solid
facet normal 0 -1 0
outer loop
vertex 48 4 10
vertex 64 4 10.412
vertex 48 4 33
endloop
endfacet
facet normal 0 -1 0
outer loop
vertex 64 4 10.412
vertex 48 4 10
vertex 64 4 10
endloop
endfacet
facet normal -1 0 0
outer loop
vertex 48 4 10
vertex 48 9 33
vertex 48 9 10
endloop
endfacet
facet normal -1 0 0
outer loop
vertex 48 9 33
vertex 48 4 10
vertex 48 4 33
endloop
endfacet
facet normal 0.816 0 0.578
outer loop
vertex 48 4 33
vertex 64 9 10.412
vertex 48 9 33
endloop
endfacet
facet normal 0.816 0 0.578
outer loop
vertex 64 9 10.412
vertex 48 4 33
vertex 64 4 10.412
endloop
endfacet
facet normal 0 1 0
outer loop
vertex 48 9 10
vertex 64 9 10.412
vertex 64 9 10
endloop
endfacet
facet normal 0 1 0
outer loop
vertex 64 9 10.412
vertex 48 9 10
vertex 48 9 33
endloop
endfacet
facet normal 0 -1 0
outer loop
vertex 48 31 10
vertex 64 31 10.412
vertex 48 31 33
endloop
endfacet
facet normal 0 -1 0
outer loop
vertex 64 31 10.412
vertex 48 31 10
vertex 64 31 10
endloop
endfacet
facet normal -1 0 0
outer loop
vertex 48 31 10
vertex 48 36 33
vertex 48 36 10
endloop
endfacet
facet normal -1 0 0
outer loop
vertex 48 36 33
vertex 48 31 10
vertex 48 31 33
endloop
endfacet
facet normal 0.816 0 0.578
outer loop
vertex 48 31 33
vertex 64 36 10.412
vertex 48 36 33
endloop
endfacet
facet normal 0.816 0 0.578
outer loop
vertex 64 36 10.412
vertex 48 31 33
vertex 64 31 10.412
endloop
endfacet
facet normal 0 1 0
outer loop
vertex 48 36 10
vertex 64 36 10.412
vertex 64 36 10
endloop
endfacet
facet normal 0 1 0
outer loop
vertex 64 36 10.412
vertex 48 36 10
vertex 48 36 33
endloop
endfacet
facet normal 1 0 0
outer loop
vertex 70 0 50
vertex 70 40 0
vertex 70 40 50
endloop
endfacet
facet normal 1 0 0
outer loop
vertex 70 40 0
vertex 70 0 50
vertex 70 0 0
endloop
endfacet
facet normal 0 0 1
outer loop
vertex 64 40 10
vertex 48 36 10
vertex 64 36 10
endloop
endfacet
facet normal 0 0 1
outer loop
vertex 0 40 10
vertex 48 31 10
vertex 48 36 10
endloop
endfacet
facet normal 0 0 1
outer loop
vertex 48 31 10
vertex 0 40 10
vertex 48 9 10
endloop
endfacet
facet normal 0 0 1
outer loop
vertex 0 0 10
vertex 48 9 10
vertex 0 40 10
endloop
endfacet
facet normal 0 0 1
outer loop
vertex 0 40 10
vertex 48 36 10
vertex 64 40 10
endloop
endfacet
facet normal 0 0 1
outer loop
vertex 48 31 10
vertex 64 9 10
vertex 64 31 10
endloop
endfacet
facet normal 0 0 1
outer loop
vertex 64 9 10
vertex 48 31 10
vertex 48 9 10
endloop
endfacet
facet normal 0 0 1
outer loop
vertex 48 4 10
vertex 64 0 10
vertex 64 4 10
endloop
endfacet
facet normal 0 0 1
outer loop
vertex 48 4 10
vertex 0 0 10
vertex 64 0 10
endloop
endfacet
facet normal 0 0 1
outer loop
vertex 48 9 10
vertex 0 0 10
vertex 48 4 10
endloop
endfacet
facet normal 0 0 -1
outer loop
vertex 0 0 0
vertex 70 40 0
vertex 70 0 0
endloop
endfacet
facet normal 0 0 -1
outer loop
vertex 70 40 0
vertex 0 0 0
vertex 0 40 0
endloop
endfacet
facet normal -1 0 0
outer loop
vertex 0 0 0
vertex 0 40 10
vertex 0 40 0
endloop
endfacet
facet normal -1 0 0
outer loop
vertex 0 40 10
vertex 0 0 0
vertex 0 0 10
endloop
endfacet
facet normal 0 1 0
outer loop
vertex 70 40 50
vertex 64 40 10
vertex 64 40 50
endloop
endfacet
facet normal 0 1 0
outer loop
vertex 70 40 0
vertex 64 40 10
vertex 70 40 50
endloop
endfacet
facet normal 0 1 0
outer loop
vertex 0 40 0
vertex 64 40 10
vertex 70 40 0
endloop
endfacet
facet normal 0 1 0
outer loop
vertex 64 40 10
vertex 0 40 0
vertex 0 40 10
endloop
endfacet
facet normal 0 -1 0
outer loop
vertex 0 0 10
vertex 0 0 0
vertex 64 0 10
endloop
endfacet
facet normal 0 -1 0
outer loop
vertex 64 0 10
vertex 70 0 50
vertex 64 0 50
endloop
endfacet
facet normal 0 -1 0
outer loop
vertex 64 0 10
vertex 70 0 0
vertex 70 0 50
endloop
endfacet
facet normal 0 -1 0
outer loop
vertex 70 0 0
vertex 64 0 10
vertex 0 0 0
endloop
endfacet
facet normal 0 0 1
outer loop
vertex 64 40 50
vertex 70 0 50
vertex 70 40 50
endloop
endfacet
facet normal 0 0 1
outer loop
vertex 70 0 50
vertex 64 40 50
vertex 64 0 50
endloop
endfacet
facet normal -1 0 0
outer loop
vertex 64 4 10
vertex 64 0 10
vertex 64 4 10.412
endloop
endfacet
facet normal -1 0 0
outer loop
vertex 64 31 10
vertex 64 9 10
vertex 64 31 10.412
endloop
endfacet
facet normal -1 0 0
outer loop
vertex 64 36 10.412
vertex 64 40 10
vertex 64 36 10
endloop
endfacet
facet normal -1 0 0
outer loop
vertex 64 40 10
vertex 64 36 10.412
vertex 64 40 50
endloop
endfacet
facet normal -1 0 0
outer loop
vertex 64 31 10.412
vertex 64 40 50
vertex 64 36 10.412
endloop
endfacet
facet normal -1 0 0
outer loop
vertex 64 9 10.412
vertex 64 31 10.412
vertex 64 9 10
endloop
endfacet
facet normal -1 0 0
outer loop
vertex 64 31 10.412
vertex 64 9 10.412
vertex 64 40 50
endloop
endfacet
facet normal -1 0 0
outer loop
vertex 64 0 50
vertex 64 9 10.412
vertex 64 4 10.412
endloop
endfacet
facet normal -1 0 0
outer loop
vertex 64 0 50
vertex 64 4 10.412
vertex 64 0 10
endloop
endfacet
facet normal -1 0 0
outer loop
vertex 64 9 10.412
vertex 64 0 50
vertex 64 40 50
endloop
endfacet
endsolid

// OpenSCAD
$fn = 32;

// ----------------------------------------------------------------------
// Rib bracket: 2-gusset L bracket
// ----------------------------------------------------------------------

// --- parameters (mm) ---
base_l = 70;              // foot length, X
base_w = 40;              // foot width, Y
base_t = 10;              // foot thickness
plate_t = 6;              // upright plate thickness
plate_h = 50;             // overall height
gus_l = 16;               // gusset leg along the foot
gus_h = 24;               // gusset height
gus_t = 5;                // gusset thickness
gus_edge = 4;             // gusset margin from the foot edge
n_gus = 2;                // gusset count

gus_pitch = (base_w - 2 * gus_edge - gus_t) / (n_gus - 1);  // gusset pitch

union() {
  cube([base_l, base_w, base_t]);
  translate([base_l - plate_t, 0, base_t - 1])
    cube([plate_t, base_w, plate_h - base_t + 1]);
  for (i = [0 : n_gus - 1])
    translate([base_l - plate_t - gus_l, gus_edge + i * gus_pitch, base_t - 1])
      rotate([-90, 0, 0])
        linear_extrude(height = gus_t)
          polygon(points = [[0, 0], [gus_l + 1, 0], [0, -gus_h]]);
}
